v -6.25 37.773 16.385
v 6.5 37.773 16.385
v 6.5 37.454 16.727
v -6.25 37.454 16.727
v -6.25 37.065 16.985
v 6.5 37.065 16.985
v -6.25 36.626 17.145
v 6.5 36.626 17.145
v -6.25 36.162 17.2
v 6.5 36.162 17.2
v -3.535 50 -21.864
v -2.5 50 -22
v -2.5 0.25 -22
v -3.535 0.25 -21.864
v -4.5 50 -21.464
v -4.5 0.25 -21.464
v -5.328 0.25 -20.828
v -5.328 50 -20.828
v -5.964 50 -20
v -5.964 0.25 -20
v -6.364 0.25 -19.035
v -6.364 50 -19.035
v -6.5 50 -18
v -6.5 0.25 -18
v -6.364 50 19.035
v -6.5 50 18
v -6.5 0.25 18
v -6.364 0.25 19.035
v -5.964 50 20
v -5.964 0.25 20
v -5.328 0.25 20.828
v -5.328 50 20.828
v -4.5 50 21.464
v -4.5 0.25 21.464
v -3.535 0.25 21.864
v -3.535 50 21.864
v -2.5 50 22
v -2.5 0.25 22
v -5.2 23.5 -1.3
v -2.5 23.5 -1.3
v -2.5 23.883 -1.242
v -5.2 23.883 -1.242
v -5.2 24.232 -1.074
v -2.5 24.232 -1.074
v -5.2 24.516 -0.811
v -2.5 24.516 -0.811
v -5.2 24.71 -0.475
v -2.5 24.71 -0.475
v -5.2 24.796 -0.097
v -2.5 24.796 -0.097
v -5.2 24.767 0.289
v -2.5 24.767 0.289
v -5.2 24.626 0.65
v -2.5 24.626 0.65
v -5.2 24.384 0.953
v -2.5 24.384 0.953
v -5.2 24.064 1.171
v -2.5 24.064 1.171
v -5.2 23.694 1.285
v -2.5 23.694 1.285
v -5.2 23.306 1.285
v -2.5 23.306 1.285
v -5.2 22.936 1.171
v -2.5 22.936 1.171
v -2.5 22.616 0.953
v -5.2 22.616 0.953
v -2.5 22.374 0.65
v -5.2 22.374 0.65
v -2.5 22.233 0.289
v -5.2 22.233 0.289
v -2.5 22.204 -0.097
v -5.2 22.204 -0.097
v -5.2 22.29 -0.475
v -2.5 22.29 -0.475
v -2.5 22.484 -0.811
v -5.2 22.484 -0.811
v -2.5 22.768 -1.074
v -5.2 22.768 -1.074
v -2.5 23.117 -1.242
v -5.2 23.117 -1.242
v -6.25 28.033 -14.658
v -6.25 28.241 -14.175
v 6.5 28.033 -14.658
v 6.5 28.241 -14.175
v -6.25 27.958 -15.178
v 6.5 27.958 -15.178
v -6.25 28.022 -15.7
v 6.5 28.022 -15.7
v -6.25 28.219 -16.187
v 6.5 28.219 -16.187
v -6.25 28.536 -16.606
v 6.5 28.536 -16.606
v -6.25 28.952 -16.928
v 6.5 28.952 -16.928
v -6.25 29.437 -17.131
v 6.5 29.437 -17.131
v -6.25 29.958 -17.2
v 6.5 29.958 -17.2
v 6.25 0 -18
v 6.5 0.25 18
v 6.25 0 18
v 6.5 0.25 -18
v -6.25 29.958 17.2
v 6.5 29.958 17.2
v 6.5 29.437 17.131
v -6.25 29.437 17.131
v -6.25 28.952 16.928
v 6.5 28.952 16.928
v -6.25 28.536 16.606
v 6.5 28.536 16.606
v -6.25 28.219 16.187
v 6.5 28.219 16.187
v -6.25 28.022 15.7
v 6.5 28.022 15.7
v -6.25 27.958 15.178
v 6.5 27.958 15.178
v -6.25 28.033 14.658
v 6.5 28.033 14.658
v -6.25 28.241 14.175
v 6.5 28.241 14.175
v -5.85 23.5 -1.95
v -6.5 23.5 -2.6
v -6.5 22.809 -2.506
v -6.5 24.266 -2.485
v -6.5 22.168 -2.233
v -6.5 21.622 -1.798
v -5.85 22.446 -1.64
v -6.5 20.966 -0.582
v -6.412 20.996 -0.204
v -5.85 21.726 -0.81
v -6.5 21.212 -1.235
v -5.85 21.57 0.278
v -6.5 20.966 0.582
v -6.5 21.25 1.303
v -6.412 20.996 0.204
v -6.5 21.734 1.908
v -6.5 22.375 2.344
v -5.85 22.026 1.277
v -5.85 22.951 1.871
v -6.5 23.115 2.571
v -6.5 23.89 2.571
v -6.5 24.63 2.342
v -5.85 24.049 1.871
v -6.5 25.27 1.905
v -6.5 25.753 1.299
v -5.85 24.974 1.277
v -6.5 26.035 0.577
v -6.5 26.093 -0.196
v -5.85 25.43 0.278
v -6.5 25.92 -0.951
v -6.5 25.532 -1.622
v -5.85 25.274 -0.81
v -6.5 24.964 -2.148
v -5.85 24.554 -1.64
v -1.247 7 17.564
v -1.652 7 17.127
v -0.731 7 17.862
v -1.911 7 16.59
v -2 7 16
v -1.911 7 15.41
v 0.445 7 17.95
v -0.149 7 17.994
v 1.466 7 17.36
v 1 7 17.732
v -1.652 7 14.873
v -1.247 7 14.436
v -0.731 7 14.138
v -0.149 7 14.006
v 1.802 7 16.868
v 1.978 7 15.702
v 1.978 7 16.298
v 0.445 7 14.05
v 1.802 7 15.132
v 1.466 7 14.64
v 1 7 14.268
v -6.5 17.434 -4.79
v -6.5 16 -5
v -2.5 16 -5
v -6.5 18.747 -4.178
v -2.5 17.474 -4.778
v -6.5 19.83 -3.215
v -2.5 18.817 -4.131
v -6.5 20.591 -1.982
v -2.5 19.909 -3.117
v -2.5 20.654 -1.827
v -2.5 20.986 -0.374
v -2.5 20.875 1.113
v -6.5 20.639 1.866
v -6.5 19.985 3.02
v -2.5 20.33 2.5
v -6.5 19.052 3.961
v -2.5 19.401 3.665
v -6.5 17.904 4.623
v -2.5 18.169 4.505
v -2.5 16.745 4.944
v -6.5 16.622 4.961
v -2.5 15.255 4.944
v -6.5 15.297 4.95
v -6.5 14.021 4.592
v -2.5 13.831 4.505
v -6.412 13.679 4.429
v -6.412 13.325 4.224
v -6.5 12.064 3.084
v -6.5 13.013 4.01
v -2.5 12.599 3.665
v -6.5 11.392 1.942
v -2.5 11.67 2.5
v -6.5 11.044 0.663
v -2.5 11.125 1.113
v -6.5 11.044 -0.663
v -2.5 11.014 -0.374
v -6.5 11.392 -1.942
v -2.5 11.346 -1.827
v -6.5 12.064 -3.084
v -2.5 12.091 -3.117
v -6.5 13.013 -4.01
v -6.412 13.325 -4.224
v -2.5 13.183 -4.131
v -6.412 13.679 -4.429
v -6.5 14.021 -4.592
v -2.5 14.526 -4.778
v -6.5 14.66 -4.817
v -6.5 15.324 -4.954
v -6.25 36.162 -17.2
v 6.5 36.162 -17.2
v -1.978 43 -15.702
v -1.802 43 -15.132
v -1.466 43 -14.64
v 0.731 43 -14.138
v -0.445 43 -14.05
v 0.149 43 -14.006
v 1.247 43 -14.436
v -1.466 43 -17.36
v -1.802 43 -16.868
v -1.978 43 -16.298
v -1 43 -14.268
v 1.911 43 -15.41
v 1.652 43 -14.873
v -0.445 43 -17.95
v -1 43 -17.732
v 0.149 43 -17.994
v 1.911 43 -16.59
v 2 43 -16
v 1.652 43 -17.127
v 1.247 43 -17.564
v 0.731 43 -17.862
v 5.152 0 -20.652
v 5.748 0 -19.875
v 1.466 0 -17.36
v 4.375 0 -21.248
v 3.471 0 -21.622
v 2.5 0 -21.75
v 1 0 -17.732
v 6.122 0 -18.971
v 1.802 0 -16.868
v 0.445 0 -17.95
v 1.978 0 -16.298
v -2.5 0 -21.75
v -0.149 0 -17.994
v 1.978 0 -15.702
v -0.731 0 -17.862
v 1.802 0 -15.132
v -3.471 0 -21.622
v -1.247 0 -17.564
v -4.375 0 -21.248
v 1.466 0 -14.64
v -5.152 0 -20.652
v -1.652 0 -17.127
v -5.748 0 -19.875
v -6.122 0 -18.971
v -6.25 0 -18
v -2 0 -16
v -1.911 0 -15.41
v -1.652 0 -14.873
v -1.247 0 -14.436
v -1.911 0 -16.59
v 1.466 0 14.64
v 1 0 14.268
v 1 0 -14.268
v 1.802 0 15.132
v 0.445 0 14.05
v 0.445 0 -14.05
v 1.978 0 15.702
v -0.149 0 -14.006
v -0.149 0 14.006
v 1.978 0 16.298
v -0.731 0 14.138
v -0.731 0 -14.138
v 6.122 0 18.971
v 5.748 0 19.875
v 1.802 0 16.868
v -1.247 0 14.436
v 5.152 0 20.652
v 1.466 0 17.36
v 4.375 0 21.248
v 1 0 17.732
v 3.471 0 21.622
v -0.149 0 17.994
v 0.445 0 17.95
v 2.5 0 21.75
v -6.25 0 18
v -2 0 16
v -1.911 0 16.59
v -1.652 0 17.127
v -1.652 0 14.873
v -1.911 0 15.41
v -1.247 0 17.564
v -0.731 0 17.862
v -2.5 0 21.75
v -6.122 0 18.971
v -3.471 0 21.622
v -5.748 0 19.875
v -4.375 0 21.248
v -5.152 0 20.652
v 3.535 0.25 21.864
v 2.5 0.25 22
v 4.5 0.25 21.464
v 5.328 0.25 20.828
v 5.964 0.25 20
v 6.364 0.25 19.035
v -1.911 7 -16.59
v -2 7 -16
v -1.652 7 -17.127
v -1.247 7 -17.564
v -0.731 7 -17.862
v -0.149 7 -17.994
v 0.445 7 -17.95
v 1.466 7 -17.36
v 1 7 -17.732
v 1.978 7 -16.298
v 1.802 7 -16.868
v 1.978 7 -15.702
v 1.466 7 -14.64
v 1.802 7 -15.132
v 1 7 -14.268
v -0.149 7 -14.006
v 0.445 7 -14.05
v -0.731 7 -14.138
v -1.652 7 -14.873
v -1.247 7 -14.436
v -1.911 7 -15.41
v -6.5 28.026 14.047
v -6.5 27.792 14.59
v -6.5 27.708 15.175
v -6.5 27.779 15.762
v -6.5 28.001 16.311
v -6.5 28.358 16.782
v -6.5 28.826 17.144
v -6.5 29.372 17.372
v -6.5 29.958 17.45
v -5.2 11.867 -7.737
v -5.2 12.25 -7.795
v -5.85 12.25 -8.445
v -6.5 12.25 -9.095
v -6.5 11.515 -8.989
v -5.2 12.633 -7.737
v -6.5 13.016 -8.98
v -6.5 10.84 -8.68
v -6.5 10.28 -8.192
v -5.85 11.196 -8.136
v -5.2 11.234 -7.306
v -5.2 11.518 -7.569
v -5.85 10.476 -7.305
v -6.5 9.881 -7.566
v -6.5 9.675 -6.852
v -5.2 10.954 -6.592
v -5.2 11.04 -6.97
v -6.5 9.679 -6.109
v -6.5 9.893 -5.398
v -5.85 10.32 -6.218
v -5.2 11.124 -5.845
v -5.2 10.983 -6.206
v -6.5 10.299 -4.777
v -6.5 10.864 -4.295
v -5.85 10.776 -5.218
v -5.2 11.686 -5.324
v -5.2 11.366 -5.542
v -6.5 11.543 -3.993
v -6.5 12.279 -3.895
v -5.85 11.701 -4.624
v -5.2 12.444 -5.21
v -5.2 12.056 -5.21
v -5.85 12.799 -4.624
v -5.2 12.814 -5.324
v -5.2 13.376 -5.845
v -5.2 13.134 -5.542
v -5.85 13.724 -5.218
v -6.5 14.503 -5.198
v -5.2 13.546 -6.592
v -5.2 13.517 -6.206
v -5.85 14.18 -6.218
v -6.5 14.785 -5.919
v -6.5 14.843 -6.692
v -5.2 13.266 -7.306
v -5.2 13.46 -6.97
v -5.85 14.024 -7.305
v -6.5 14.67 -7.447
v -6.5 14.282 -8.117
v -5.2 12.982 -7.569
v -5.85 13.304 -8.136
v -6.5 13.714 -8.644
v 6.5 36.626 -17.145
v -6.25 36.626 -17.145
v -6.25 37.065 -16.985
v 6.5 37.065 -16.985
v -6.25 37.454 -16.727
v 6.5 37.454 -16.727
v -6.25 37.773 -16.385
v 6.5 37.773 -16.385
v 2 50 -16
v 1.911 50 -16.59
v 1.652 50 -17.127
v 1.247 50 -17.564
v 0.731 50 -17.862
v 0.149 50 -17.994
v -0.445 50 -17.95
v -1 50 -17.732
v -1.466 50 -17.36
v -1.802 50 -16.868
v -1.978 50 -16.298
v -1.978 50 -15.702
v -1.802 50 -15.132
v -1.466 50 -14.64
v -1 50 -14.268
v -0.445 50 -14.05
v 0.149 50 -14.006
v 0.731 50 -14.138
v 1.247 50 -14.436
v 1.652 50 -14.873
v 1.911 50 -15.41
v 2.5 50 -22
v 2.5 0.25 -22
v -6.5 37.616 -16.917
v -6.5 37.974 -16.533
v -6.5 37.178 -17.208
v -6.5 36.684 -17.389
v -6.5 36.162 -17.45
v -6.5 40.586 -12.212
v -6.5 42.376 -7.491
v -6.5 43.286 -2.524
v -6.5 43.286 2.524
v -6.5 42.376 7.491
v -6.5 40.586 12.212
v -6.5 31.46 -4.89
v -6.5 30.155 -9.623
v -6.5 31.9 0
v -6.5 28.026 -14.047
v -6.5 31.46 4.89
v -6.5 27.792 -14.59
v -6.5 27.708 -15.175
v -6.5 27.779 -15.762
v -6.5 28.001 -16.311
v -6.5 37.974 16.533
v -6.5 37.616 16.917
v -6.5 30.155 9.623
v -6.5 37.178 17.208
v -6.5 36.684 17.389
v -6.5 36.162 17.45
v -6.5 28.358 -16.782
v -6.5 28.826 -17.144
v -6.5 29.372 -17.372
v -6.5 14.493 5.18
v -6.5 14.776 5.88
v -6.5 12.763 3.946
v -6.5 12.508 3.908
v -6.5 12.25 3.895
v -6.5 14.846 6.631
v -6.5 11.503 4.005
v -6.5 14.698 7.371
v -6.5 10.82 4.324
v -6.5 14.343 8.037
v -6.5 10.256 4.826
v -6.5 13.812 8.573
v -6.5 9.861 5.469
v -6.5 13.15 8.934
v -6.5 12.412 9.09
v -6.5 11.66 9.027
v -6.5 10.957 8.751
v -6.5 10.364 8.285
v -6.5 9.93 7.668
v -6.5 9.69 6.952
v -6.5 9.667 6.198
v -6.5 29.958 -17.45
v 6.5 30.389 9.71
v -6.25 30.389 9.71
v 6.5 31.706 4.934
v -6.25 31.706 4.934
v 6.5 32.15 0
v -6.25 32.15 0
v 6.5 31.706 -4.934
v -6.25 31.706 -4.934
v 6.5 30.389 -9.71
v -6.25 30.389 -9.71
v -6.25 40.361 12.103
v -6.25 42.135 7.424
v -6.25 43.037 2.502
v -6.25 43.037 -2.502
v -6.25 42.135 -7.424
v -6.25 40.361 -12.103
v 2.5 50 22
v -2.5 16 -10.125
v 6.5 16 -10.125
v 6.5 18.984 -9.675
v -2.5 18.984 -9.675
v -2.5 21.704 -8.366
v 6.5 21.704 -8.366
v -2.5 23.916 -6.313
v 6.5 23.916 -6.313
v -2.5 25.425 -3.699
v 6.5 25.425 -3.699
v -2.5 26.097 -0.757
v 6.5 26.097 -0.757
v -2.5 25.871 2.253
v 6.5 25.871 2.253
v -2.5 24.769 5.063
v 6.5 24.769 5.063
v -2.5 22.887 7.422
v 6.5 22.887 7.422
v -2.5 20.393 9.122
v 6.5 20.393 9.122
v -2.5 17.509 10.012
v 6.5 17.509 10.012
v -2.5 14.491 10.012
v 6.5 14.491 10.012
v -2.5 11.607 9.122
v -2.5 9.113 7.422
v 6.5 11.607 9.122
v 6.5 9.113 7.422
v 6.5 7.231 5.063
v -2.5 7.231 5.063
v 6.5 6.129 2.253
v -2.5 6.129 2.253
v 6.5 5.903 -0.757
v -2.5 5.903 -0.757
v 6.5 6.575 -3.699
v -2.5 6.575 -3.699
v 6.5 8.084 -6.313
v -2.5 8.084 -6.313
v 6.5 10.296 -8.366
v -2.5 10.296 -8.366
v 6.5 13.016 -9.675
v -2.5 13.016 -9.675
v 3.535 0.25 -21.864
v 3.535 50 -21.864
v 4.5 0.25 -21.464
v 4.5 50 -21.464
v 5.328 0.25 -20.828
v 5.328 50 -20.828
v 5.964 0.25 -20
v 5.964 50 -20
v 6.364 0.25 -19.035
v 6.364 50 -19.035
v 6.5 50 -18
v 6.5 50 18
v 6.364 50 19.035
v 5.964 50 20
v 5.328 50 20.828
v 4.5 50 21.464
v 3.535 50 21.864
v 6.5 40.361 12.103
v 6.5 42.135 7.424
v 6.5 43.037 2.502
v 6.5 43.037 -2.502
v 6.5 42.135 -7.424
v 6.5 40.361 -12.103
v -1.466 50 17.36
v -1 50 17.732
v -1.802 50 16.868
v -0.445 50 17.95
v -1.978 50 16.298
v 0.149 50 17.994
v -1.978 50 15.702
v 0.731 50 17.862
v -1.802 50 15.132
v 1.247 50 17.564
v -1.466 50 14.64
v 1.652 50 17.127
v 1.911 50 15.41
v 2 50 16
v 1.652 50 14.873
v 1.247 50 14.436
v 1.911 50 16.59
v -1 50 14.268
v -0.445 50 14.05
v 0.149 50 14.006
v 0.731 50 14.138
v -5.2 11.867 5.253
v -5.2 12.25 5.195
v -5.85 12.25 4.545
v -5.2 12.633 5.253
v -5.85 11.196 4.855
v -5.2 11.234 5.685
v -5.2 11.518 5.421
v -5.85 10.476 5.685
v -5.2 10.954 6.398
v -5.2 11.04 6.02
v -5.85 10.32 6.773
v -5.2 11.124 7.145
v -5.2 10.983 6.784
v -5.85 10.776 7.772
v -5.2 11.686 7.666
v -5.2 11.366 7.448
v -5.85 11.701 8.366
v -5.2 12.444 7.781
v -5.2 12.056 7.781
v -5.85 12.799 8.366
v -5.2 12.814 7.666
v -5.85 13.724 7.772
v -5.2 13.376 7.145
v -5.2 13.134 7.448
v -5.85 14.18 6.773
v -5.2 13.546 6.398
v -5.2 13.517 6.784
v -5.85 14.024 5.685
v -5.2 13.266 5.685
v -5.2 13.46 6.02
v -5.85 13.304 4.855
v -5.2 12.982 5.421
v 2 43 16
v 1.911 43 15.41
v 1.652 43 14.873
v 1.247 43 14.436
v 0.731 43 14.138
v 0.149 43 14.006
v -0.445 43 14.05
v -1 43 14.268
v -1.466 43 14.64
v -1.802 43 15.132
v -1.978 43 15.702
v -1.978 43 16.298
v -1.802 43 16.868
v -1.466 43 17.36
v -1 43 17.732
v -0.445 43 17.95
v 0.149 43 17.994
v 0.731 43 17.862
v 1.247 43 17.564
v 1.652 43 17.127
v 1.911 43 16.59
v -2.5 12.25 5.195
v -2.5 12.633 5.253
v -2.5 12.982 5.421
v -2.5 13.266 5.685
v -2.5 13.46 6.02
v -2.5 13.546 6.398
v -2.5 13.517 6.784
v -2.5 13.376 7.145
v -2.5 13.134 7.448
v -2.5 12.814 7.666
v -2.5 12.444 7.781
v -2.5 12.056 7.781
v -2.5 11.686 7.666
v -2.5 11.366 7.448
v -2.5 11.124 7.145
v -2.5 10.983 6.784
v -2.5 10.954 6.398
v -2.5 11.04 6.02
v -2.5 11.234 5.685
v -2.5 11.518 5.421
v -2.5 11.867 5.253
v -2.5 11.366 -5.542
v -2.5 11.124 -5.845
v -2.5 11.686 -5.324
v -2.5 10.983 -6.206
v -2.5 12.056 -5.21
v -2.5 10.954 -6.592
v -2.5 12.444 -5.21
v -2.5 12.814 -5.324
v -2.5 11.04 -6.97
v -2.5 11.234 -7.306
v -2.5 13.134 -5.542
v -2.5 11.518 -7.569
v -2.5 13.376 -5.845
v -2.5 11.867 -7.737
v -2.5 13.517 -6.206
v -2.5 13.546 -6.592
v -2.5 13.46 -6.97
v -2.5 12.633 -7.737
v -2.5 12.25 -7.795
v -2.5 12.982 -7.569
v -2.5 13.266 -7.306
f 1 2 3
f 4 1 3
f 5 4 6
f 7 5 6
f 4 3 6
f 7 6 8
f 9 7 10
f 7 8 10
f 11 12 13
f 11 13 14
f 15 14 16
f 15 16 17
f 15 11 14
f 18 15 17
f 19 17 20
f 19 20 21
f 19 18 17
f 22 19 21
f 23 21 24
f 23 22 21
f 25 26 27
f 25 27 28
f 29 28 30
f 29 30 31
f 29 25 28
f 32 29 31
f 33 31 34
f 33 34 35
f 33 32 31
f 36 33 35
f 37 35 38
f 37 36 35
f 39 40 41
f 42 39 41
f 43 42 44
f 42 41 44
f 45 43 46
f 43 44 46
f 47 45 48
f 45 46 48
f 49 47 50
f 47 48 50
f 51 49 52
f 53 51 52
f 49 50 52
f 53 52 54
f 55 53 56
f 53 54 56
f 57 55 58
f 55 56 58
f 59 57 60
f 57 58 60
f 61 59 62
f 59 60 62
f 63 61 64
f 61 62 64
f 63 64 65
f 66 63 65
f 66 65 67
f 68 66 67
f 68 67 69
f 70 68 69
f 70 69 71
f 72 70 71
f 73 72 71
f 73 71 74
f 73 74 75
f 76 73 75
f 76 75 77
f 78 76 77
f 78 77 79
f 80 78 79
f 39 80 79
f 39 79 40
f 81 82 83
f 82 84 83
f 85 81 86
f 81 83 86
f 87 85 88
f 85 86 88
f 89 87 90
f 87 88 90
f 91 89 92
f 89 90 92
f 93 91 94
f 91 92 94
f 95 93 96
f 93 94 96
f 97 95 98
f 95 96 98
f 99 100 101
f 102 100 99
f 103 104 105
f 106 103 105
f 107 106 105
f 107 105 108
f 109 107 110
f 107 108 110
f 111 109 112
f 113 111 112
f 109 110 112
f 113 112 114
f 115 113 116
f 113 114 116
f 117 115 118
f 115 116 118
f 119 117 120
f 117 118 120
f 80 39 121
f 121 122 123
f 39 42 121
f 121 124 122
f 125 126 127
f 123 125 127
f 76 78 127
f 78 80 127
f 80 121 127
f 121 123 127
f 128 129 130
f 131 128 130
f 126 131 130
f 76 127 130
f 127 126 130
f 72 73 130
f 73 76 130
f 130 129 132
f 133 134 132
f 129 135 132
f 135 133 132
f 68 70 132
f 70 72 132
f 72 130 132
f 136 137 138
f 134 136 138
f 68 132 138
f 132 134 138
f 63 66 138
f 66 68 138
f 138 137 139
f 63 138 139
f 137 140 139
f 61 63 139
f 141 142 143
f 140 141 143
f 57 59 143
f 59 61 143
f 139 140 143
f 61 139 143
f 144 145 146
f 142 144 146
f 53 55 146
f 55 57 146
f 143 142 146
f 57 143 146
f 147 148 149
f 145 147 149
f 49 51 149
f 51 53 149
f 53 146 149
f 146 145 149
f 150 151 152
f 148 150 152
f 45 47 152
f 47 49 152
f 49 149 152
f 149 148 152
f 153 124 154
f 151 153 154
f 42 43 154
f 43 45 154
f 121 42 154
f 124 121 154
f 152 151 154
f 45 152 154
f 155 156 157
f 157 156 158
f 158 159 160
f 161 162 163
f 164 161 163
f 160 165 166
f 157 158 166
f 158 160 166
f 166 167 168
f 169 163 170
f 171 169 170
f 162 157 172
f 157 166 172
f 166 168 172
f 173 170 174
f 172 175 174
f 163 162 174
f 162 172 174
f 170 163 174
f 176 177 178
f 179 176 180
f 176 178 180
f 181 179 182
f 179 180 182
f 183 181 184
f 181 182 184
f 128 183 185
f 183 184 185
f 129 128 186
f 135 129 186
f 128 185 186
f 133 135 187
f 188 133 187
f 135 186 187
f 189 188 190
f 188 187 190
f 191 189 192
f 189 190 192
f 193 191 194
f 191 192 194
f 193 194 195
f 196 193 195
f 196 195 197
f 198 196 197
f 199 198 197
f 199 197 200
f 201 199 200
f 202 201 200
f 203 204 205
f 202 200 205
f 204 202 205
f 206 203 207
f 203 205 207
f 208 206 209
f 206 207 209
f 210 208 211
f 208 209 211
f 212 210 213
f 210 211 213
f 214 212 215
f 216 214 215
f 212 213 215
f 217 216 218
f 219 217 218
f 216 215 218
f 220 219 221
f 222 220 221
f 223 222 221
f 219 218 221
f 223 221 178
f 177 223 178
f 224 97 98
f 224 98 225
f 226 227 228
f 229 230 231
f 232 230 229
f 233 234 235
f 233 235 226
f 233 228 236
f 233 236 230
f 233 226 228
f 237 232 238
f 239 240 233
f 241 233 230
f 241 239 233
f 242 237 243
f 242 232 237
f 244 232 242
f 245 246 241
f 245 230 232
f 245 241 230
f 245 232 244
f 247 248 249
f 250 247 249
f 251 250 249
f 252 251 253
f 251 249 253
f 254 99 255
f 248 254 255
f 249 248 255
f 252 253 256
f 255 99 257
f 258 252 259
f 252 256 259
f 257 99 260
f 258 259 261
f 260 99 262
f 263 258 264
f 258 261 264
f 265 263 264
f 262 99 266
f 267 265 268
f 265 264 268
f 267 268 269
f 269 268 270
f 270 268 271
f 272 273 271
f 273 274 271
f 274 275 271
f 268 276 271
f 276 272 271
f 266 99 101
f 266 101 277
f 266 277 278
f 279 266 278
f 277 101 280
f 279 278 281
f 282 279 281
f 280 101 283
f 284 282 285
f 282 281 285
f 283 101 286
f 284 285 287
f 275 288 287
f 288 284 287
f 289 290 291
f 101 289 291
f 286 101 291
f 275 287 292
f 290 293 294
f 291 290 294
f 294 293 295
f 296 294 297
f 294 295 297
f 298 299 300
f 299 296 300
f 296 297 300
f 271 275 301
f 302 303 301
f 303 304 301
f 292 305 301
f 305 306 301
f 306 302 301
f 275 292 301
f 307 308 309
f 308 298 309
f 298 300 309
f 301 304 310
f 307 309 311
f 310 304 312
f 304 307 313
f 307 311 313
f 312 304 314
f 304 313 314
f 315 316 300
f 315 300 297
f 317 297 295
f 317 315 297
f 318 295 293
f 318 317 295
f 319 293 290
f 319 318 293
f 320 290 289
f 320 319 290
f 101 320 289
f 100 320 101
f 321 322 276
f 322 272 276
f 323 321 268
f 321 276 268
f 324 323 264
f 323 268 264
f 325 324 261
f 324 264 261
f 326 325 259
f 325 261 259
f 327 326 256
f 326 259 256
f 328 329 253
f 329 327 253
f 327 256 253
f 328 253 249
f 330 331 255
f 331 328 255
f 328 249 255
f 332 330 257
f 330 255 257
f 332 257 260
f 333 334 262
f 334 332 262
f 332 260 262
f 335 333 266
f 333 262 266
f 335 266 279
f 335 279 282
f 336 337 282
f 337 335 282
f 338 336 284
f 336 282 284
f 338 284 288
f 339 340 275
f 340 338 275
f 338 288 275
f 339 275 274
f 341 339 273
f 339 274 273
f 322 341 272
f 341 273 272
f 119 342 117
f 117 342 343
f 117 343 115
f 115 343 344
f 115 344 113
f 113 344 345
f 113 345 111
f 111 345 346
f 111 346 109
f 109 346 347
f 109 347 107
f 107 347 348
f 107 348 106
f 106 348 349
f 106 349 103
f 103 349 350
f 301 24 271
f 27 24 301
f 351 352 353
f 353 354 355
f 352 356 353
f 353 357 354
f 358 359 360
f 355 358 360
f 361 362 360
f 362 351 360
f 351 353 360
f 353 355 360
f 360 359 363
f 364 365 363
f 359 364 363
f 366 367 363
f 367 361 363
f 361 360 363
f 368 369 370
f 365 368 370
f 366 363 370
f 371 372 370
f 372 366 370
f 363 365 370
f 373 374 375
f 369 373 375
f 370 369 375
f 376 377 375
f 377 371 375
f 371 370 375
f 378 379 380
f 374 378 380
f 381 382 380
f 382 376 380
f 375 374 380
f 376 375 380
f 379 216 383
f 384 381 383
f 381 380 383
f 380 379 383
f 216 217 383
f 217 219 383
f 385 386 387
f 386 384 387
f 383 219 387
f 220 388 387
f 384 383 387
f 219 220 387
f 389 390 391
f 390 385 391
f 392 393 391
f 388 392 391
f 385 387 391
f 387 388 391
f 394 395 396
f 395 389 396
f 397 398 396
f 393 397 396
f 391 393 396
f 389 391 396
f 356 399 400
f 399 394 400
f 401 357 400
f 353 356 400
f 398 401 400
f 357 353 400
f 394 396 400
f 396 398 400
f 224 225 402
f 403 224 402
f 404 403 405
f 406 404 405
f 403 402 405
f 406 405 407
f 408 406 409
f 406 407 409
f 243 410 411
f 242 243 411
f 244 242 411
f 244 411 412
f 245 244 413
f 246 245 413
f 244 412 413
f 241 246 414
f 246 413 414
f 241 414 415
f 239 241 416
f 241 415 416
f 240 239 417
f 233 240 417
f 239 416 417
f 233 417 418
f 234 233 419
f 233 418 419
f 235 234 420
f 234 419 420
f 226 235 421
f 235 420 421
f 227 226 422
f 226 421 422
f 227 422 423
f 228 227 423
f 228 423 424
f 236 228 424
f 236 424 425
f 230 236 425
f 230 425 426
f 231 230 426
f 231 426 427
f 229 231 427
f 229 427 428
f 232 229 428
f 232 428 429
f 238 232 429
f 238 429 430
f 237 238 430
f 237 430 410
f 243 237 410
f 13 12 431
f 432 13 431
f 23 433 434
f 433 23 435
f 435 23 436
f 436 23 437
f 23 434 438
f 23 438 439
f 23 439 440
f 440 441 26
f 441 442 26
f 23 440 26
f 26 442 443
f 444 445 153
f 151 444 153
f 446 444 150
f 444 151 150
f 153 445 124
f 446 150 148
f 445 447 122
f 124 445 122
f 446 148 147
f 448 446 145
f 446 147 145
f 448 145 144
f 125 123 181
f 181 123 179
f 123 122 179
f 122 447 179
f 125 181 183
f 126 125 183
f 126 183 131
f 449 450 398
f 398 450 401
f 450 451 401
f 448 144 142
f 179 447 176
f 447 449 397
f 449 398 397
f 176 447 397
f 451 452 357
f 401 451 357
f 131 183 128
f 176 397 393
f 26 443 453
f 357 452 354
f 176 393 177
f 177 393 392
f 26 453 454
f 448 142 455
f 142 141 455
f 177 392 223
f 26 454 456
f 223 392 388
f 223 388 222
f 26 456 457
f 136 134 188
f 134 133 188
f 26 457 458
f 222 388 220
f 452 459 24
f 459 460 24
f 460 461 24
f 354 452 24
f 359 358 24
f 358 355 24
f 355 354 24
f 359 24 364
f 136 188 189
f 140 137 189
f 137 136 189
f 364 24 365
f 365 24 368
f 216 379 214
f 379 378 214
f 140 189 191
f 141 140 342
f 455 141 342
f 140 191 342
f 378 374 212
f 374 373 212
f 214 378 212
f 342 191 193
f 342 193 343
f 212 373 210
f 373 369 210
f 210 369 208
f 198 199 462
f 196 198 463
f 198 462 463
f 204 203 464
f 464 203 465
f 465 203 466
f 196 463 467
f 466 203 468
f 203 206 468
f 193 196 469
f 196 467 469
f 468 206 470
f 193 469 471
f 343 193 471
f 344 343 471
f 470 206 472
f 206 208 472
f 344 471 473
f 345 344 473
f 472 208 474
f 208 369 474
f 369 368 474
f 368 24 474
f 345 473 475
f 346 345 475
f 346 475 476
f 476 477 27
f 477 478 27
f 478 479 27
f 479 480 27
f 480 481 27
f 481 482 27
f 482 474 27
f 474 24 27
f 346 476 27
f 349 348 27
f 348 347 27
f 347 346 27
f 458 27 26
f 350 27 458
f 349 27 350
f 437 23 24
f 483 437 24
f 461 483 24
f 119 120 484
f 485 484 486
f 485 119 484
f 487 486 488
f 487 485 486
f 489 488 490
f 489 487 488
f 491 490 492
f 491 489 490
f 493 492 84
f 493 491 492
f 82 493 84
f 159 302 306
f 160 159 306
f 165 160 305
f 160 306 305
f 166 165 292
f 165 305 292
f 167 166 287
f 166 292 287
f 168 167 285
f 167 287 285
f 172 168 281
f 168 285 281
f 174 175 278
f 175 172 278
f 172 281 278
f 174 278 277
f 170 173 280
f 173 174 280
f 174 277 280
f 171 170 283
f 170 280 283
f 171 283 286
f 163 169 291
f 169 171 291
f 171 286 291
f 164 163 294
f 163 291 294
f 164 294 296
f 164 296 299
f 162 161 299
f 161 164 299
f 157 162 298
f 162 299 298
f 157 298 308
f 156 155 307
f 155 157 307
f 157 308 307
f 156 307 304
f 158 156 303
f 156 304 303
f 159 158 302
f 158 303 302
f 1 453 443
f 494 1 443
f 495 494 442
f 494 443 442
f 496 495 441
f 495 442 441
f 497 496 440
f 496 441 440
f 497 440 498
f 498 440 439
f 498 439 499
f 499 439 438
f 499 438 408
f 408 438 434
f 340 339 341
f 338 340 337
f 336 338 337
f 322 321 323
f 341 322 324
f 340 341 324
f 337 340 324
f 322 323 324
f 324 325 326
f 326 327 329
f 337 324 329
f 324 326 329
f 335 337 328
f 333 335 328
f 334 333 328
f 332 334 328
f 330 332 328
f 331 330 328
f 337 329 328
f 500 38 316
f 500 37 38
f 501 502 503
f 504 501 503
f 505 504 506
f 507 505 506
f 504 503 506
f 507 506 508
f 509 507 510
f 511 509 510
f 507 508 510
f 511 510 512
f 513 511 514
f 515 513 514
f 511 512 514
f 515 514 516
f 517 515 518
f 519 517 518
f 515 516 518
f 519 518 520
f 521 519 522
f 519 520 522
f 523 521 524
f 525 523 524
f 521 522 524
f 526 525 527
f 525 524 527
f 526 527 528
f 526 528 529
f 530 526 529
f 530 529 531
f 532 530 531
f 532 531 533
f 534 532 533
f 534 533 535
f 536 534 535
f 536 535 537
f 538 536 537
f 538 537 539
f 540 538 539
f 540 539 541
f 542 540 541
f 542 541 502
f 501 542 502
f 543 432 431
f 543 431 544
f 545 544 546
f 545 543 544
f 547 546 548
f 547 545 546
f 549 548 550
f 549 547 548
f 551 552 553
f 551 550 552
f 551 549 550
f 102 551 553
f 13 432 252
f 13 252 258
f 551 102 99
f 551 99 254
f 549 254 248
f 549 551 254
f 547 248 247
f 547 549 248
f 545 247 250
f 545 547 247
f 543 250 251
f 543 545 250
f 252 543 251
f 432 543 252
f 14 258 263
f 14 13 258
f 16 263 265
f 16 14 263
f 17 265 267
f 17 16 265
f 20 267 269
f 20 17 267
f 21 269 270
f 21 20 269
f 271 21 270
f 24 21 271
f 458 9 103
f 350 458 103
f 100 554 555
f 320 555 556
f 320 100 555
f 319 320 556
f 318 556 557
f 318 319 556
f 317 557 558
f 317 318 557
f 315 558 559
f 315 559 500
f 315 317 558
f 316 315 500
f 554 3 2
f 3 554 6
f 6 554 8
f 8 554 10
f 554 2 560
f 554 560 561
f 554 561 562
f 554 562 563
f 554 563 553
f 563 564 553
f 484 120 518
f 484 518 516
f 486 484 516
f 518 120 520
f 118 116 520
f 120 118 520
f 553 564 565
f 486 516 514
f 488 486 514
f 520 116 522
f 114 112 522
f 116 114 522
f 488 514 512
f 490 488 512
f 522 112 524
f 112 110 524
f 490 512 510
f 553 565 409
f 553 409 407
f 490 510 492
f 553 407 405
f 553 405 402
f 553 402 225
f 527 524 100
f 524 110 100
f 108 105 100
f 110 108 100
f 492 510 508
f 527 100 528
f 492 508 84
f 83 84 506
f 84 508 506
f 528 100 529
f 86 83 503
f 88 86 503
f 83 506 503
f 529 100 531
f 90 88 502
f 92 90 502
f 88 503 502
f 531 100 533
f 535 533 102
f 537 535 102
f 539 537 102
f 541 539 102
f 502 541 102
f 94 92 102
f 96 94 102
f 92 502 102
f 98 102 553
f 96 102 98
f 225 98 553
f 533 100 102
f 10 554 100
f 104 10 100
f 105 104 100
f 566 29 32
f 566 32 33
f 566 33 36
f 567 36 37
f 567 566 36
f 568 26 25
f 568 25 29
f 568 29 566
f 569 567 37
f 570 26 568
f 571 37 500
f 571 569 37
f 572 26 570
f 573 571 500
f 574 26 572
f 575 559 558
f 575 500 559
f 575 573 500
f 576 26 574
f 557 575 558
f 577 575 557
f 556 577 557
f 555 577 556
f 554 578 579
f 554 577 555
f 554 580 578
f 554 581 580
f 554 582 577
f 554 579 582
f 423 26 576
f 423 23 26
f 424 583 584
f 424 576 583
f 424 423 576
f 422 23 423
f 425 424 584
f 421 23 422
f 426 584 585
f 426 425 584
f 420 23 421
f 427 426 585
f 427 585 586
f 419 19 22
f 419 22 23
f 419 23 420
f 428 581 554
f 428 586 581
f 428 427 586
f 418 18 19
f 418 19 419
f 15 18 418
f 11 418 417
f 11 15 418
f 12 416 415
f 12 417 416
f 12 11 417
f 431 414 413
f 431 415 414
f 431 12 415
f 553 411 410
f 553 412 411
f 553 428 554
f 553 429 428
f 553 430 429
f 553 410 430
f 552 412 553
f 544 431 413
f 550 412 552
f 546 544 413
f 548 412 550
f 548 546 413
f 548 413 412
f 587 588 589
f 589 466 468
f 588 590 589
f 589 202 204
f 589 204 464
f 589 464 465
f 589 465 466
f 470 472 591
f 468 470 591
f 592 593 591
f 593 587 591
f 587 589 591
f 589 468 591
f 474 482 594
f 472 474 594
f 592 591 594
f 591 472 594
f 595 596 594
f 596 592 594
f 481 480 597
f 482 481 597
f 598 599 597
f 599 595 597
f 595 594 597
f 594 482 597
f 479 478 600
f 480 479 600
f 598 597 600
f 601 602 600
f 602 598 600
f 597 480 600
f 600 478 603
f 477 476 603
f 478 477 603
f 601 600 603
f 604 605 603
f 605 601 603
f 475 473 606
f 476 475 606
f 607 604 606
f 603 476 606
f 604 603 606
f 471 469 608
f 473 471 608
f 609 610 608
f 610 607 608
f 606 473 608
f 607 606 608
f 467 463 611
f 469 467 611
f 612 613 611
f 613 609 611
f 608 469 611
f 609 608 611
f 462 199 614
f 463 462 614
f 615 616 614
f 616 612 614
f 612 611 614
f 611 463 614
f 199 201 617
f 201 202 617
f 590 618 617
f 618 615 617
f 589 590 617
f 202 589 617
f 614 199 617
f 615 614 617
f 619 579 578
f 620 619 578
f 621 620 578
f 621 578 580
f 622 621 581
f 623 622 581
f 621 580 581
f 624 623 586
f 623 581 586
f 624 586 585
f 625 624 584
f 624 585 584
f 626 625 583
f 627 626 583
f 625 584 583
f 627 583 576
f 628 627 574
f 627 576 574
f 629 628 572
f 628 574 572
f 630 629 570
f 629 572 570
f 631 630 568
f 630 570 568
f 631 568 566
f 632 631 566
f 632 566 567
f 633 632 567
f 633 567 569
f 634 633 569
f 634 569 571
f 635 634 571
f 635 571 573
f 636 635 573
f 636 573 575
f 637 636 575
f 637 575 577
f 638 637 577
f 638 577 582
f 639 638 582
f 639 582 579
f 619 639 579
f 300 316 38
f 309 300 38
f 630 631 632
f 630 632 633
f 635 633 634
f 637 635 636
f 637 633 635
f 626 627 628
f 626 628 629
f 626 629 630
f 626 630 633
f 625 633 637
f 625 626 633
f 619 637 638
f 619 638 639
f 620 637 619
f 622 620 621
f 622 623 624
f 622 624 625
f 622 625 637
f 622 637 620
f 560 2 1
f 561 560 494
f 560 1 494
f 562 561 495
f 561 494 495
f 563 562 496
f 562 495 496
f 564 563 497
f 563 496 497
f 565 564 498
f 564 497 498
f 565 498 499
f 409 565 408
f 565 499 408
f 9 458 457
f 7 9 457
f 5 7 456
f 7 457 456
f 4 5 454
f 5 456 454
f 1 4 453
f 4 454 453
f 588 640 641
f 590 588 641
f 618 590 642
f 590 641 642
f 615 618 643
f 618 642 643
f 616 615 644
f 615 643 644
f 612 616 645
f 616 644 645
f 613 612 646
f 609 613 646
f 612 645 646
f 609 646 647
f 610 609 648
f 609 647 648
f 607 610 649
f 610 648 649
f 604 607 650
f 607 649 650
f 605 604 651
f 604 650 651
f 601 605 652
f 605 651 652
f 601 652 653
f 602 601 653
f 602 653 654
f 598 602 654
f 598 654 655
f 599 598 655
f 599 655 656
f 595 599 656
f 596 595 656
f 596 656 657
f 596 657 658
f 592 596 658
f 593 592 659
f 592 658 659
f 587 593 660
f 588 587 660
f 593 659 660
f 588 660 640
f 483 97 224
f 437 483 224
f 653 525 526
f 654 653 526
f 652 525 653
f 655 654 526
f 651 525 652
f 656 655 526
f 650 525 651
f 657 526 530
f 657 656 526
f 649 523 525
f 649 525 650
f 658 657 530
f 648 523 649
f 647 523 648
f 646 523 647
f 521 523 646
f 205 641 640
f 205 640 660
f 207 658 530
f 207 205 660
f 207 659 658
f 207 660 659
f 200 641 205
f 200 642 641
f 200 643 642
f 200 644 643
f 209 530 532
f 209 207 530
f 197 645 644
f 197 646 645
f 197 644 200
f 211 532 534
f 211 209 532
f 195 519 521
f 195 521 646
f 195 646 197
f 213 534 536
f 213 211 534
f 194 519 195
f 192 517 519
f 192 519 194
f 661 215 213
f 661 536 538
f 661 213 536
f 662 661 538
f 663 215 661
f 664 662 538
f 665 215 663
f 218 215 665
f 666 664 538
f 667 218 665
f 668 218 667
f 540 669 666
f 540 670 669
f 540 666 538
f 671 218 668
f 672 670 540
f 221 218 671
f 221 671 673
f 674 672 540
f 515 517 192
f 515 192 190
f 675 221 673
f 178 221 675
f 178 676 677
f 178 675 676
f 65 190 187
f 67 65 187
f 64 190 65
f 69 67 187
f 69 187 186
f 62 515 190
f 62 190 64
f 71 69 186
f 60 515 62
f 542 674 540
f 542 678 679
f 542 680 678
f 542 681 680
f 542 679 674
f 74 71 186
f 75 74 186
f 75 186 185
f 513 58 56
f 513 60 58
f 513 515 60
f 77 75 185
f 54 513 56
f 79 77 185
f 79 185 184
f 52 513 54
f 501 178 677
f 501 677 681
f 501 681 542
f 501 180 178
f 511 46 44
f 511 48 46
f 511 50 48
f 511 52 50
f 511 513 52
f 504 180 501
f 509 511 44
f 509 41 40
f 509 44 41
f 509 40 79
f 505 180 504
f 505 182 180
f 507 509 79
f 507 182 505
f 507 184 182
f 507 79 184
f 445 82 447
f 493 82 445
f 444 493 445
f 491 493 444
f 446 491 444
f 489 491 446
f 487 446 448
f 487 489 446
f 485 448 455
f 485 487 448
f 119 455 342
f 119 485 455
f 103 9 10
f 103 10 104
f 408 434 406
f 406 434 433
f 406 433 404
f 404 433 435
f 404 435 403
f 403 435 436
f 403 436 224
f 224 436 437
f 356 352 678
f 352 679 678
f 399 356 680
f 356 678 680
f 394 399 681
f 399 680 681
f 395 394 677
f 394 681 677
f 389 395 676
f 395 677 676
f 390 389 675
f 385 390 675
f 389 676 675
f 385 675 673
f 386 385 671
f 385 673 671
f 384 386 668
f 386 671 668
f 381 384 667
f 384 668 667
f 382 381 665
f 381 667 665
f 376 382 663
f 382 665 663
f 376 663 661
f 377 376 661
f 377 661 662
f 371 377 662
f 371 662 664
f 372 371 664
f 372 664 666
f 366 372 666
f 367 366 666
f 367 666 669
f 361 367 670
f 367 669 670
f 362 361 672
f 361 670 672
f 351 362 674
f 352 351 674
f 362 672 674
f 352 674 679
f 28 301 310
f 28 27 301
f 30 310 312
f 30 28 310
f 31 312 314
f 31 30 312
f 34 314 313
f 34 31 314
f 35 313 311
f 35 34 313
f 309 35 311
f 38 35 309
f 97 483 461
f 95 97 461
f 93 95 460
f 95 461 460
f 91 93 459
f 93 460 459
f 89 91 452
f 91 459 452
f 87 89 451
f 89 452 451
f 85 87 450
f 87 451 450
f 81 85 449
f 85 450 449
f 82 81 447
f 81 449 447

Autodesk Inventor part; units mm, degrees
ref_plane "YZ Plane" through (0, 0, 0) normal (1, 0, 0) x (0, 1, 0)
ref_plane "XZ Plane" through (0, 0, 0) normal (0, 1, 0) x (-1, 0, 0)
ref_plane "XY Plane" through (0, 0, 0) normal (0, 0, 1) x (1, 0, 0)
sketch "Эскиз1" plane through (0, 0, 0) normal (0, 1, 0) x (-1, 0, 0)
  line L0 (6.5, 31) -> (-6.5, 31)
  line L1 (-6.5, 31) -> (-6.5, -31)
  line L2 (-6.5, -31) -> (6.5, -31)
  line L3 (6.5, -31) -> (6.5, 31)
  line L4 (-6.5, 31) -> (6.5, -31) construction
  line L5 (0, 31) -> (0, -31) construction
  circle A0 centre (0, 16) radius 2
  line L6 (6.5, 0) -> (-6.5, 0) construction
  circle A1 centre (0, -16) radius 2
  point P0 (0, 0)
  point P1 (0, 0)
  dimension "d0" = 13
  dimension "d1" = 62
  dimension "d2" = 16
  dimension "d3" = 4
extrude "Выдавливание1" add sketch "Эскиз1" along normal blind 32
sketch "Эскиз2" plane through (6.5, 0, 31) normal (1, 0, 0) x (0, 0, -1)
  line L0 (0, 32) -> (62, 32)
  line L1 (62, 0) -> (0, 0)
  line L2 (62, 32) -> (0, 0) construction
  circle A0 centre (31, 16) radius 10.15
  line L3 (20.85, 16) -> (41.15, 16) construction
  circle A1 centre (31, 16) radius 10.125
  line L4 (31, 26.125) -> (31, 5.875)
  line L5 (62, 0) -> (62, 32)
  circle A2 centre (31, 16) radius 5
  line L6 (31, 16) -> (24.504809, 12.25) construction
  line L7 (31, 16) -> (37.495191, 12.25) construction
  circle A3 centre (31, 16) radius 7.5 construction
  circle A4 centre (31, 23.5) radius 1.3
  circle A5 centre (37.495191, 12.25) radius 1.3
  circle A6 centre (24.504809, 12.25) radius 1.3
  line L8 (37.495191, 12.25) -> (36.55555, 10.622495) construction
  circle A7 centre (31, 16) radius 10 construction
  line L9 (37.495191, 12.25) -> (39.660254, 11) construction
  point P0 (31, 0)
  dimension "d60" = 20
  dimension "d9" = 20.3
  dimension "d17" = 10
  dimension "d21" = 20.25
  dimension "d57" = 120
  dimension "d58" = 120
  dimension "d59" = 2.6
  dimension "d61" = 2.5
  dimension "d65" = 15
extrude "Выдавливание3" cut sketch "Эскиз2" against normal through all contours A4 L4 | L4 A4 | A2 L4 | L4 A2 | A5 | A6
sketch "Эскиз2 outline for Выдавливание4" plane through (6.5, 0, 31) normal (1, 0, 0) x (0, 0, -1)
  circle A0 centre (31, 16) radius 10.125
extrude "Выдавливание4" cut sketch "Эскиз2 outline for Выдавливание4" against normal blind 9
sketch "Эскиз3" plane through (0, 32, 0) normal (0, 1, 0) x (1, 0, 0)
  circle A0 centre (0, -16) radius 2 projected
  circle A1 centre (0, 16) radius 2 projected
  point P0 (0, 0)
extrude "Выдавливание5" add sketch "Эскиз3" against normal blind 25
fillet "Сопряжение1" radius 6 2 edges at (6.5, 16, 31) (6.5, 16, -31)
chamfer "Фаска1" distance 1.3 angle 45 3 edges at (-6.5, 12.25, 7.7952) (-6.5, 12.25, -5.1952) (-6.5, 23.5, 1.3)
sketch "Эскиз6" plane through (0, 32, 0) normal (0, 1, 0) x (1, 0, 0)
  arc A0 (6.5, 25) -> (0.5, 31) centre (0.5, 25) ccw projected
  line L0 (0.5, 31) -> (-6.5, 31) projected
  line L1 (-6.5, 31) -> (-6.5, -31) projected
  line L2 (-6.5, -31) -> (0.5, -31) projected
  arc A1 (0.5, -31) -> (6.5, -25) centre (0.5, -25) ccw projected
  line L3 (6.5, -25) -> (6.5, 25) projected
  point P0 (0, 0)
extrude "Выдавливание6" add sketch "Эскиз6" along normal blind 18
sketch "Эскиз7" plane through (0, 50, 0) normal (0, 1, 0) x (1, 0, 0)
  circle A0 centre (0, -16) radius 2 projected
  circle A1 centre (0, 16) radius 2 projected
  point P0 (0, 0)
extrude "Выдавливание7" cut sketch "Эскиз7" against normal blind 7
sketch "Эскиз9" plane through (-6.5, 0, -31) normal (-1, 0, 0) x (0, 0, 1)
  line L0 (0, 0) -> (0, 50)
  line L1 (0, 50) -> (62, 0) construction
  line L2 (7.2, 43) -> (54.8, 43)
  line L3 (54.8, 43) -> (54.8, 7)
  line L4 (54.8, 7) -> (7.2, 7)
  line L5 (7.2, 7) -> (7.2, 43)
  line L6 (0, 50) -> (62, 50)
  line L7 (0, 0) -> (62, 0)
  line L8 (62, 0) -> (62, 50)
  line L9 (62, 0) -> (56, 0)
  line L10 (7.2, 43) -> (0, 43) construction
  line L11 (7.2, 7) -> (0, 7) construction
  line L12 (54.8, 7) -> (62, 7) construction
  line L13 (54.8, 43) -> (62, 43) construction
  arc A0 (0, 7) -> (0, 43) centre (-18.9, 25) ccw
  arc A1 (62, 43) -> (62, 7) centre (80.9, 25) ccw
  line L14 (13.8, 38.870968) -> (48.2, 38.870968) construction
  line L15 (48.2, 38.870968) -> (48.2, 26.15)
  line L16 (48.2, 26.15) -> (13.8, 26.15) construction
  line L17 (13.8, 26.15) -> (13.8, 38.870968)
  line L18 (31, 38.870968) -> (31, 50) construction
  arc A2 (48.2, 26.15) -> (13.8, 26.15) centre (31, 4.496667) ccw
  arc A3 (26.990369, 13.012884) -> (35.009631, 13.012884) centre (31, 16) ccw
  arc A4 (48.2, 37.15) -> (13.8, 37.15) centre (31, 15.496667) ccw
  line L19 (13.8, 37.15) -> (48.2, 37.15) construction
  circle A5 centre (31, 16) radius 10.15 construction
  point P0 (31, 0)
  point P1 (31, 25)
  point P2 (54.8, 25)
  point P3 (7.2, 25)
  point P4 (31, 32.15)
  dimension "d30" = 7
  dimension "d31" = 7
  dimension "d33" = 7.2
  dimension "d42" = 6.6
  dimension "d44" = 11
  dimension "d45" = 6
extrude "Выдавливание8" cut sketch "Эскиз9" against normal up to surface (13 mm away) contours L0 A0 | A1 L8
extrude "Выдавливание9" cut sketch "Эскиз9" against normal up to surface (13 mm away) contours A4 L2 | L2 A4 L15 A2 L17
fillet "Сопряжение2" radius 2 4 edges at (0, 26.15, 17.2) (0, 26.15, -17.2) (0, 37.15, 17.2) (0, 37.15, -17.2)
sketch "Эскиз11" plane through (0, 50, 0) normal (0, 1, 0) x (1, 0, 0)
  arc A0 (1, -22) -> (-3, -26) centre (1, -26) ccw
  line L0 (-3, -29.486243) -> (-3, -26)
  line L1 (5.457212, -22) -> (-4.601252, -22)
  arc A1 (-3, -29.486243) -> (-1.997801, -32.134486) centre (1, -29.486243) ccw
  arc A2 (-3, -29.486243) -> (-1.997801, -32.134486) centre (1, -29.486243) ccw
  line L2 (-1.997801, -32.134486) -> (17.505015, -54.211602)
  line L3 (6.5, -25) -> (6.5, 25)
  line L4 (5.457212, -22) -> (6.5, -22)
  arc A3 (0.5, -31) -> (6.5, -25) centre (0.5, -25) ccw
  line L5 (-6.5, -31) -> (0.5, -31)
  line L6 (6.5, -31) -> (6.5, 31)
  point P0 (0, 0)
  point P1 (-2.702505, -31)
  point P2 (-2.877907, -22)
  point P3 (0.96893, -22.000121)
extrude "Выдавливание10" cut sketch "Эскиз11" against normal up to surface (50 mm away)
mirror "Зеркальное отражение1" about plane through (0, 0, 0) normal (0, 0, 1) of "Выдавливание10"
fillet "Сопряжение3" radius 4 2 edges at (6.5, 25, 22) (6.5, 25, -22)
sketch "Эскиз12" plane through (0, 50, 0) normal (0, 1, 0) x (1, 0, 0)
  circle A0 centre (0, 16) radius 2
  circle A1 centre (0, -16) radius 2
  circle A2 centre (0, -16) radius 2
  line L0 (0, 16) -> (0, -16)
  arc A3 (6.5, 18) -> (2.5, 22) centre (2.5, 18) ccw
  line L1 (6.5, -18) -> (6.5, 18)
  arc A4 (2.5, -22) -> (6.5, -18) centre (2.5, -18) ccw
  arc A5 (-2.5, 22) -> (-6.5, 18) centre (-2.5, 18) ccw
  line L2 (-6.5, -18) -> (-6.5, 18)
  arc A6 (-6.5, -18) -> (-2.5, -22) centre (-2.5, -18) ccw
  arc A7 (6.5, 18) -> (2.5, 22) centre (2.5, 18) ccw
  line L3 (2.5, 22) -> (1, 22)
  arc A8 (-3, 26) -> (1, 22) centre (1, 26) ccw
  line L4 (-3, 26) -> (-3, 29.486243)
  arc A9 (-2.702505, 31) -> (-3, 29.486243) centre (1, 29.486243) ccw
  line L5 (-2.702505, 31) -> (-6.5, 31)
  line L6 (-6.5, 31) -> (-6.5, -31)
  line L7 (-6.5, -31) -> (-2.702505, -31)
  arc A10 (-3, -29.486243) -> (-2.702505, -31) centre (1, -29.486243) ccw
  line L8 (-3, -29.486243) -> (-3, -26)
  arc A11 (1, -22) -> (-3, -26) centre (1, -26) ccw
  line L9 (1, -22) -> (2.5, -22)
  arc A12 (2.5, -22) -> (6.5, -18) centre (2.5, -18) ccw
  line L10 (6.5, -18) -> (6.5, 18)
  circle A13 centre (0, 16) radius 2
  circle A14 centre (0, -16) radius 2
  line L11 (1, 22) -> (2.5, 22)
  line L12 (-2.5, 22) -> (2.5, 22)
  line L13 (2.5, -22) -> (1, -22)
  line L14 (-2.5, -22) -> (1, -22)
  point P0 (0, 0)
  point P1 (1, 22)
extrude "Выдавливание11" cut sketch "Эскиз12" against normal up to surface (50 mm away) contours L12 A5 L6 L5 A9 L4 A8 | A11 L8 A10 L7 L6 A6 L14
chamfer "Фаска2" distance 0.25 angle 45 8 edges at (6.5, 0, 0) (5.3284, 0, -20.8284) (0, 0, -22) (-5.3284, 0, -20.8284) (-6.5, 0, 0) (-5.3284, 0, 20.8284) (0, 0, 22) (5.3284, 0, 20.8284)
chamfer "Фаска3" distance 0.25 angle 45 8 edges at (-6.5, 43.15, 0) (-6.5, 37.0647, 16.9847) (-6.5, 33.06, 17.2) (-6.5, 28.2187, 16.1873) (-6.5, 32.15, 0) (-6.5, 28.2187, -16.1873) (-6.5, 33.06, -17.2) (-6.5, 37.0647, -16.9847)
sketch "Эскиз13" plane through (0, 0, 0) normal (0, -1, 0) x (1, 0, 0)
  point P0 (0, 0)
equation "\"d58\" = d57"
equation "\"d31\" = d30"
equation "\"Радиус_гибки\" = Толщина"
equation "\"Ширина_просечки\" = Толщина"
equation "\"Глубина_просечки\" = 0.5 * Толщина"
equation "\"Размер_просечки\" = 4 * Толщина"
equation "\"Мин_остаток\" = 2 * Толщина"
equation "\"Радиус_перехода\" = Радиус_гибки"
equation "\"Радиус_Якоби\" = Радиус_гибки"
equation "\"Размер_зазора\" = Толщина"
equation "\"Толщина\" = 3.048"
properties part number "motor_mount_edge_v2" material "Полиэтилен, низкая плотность"
